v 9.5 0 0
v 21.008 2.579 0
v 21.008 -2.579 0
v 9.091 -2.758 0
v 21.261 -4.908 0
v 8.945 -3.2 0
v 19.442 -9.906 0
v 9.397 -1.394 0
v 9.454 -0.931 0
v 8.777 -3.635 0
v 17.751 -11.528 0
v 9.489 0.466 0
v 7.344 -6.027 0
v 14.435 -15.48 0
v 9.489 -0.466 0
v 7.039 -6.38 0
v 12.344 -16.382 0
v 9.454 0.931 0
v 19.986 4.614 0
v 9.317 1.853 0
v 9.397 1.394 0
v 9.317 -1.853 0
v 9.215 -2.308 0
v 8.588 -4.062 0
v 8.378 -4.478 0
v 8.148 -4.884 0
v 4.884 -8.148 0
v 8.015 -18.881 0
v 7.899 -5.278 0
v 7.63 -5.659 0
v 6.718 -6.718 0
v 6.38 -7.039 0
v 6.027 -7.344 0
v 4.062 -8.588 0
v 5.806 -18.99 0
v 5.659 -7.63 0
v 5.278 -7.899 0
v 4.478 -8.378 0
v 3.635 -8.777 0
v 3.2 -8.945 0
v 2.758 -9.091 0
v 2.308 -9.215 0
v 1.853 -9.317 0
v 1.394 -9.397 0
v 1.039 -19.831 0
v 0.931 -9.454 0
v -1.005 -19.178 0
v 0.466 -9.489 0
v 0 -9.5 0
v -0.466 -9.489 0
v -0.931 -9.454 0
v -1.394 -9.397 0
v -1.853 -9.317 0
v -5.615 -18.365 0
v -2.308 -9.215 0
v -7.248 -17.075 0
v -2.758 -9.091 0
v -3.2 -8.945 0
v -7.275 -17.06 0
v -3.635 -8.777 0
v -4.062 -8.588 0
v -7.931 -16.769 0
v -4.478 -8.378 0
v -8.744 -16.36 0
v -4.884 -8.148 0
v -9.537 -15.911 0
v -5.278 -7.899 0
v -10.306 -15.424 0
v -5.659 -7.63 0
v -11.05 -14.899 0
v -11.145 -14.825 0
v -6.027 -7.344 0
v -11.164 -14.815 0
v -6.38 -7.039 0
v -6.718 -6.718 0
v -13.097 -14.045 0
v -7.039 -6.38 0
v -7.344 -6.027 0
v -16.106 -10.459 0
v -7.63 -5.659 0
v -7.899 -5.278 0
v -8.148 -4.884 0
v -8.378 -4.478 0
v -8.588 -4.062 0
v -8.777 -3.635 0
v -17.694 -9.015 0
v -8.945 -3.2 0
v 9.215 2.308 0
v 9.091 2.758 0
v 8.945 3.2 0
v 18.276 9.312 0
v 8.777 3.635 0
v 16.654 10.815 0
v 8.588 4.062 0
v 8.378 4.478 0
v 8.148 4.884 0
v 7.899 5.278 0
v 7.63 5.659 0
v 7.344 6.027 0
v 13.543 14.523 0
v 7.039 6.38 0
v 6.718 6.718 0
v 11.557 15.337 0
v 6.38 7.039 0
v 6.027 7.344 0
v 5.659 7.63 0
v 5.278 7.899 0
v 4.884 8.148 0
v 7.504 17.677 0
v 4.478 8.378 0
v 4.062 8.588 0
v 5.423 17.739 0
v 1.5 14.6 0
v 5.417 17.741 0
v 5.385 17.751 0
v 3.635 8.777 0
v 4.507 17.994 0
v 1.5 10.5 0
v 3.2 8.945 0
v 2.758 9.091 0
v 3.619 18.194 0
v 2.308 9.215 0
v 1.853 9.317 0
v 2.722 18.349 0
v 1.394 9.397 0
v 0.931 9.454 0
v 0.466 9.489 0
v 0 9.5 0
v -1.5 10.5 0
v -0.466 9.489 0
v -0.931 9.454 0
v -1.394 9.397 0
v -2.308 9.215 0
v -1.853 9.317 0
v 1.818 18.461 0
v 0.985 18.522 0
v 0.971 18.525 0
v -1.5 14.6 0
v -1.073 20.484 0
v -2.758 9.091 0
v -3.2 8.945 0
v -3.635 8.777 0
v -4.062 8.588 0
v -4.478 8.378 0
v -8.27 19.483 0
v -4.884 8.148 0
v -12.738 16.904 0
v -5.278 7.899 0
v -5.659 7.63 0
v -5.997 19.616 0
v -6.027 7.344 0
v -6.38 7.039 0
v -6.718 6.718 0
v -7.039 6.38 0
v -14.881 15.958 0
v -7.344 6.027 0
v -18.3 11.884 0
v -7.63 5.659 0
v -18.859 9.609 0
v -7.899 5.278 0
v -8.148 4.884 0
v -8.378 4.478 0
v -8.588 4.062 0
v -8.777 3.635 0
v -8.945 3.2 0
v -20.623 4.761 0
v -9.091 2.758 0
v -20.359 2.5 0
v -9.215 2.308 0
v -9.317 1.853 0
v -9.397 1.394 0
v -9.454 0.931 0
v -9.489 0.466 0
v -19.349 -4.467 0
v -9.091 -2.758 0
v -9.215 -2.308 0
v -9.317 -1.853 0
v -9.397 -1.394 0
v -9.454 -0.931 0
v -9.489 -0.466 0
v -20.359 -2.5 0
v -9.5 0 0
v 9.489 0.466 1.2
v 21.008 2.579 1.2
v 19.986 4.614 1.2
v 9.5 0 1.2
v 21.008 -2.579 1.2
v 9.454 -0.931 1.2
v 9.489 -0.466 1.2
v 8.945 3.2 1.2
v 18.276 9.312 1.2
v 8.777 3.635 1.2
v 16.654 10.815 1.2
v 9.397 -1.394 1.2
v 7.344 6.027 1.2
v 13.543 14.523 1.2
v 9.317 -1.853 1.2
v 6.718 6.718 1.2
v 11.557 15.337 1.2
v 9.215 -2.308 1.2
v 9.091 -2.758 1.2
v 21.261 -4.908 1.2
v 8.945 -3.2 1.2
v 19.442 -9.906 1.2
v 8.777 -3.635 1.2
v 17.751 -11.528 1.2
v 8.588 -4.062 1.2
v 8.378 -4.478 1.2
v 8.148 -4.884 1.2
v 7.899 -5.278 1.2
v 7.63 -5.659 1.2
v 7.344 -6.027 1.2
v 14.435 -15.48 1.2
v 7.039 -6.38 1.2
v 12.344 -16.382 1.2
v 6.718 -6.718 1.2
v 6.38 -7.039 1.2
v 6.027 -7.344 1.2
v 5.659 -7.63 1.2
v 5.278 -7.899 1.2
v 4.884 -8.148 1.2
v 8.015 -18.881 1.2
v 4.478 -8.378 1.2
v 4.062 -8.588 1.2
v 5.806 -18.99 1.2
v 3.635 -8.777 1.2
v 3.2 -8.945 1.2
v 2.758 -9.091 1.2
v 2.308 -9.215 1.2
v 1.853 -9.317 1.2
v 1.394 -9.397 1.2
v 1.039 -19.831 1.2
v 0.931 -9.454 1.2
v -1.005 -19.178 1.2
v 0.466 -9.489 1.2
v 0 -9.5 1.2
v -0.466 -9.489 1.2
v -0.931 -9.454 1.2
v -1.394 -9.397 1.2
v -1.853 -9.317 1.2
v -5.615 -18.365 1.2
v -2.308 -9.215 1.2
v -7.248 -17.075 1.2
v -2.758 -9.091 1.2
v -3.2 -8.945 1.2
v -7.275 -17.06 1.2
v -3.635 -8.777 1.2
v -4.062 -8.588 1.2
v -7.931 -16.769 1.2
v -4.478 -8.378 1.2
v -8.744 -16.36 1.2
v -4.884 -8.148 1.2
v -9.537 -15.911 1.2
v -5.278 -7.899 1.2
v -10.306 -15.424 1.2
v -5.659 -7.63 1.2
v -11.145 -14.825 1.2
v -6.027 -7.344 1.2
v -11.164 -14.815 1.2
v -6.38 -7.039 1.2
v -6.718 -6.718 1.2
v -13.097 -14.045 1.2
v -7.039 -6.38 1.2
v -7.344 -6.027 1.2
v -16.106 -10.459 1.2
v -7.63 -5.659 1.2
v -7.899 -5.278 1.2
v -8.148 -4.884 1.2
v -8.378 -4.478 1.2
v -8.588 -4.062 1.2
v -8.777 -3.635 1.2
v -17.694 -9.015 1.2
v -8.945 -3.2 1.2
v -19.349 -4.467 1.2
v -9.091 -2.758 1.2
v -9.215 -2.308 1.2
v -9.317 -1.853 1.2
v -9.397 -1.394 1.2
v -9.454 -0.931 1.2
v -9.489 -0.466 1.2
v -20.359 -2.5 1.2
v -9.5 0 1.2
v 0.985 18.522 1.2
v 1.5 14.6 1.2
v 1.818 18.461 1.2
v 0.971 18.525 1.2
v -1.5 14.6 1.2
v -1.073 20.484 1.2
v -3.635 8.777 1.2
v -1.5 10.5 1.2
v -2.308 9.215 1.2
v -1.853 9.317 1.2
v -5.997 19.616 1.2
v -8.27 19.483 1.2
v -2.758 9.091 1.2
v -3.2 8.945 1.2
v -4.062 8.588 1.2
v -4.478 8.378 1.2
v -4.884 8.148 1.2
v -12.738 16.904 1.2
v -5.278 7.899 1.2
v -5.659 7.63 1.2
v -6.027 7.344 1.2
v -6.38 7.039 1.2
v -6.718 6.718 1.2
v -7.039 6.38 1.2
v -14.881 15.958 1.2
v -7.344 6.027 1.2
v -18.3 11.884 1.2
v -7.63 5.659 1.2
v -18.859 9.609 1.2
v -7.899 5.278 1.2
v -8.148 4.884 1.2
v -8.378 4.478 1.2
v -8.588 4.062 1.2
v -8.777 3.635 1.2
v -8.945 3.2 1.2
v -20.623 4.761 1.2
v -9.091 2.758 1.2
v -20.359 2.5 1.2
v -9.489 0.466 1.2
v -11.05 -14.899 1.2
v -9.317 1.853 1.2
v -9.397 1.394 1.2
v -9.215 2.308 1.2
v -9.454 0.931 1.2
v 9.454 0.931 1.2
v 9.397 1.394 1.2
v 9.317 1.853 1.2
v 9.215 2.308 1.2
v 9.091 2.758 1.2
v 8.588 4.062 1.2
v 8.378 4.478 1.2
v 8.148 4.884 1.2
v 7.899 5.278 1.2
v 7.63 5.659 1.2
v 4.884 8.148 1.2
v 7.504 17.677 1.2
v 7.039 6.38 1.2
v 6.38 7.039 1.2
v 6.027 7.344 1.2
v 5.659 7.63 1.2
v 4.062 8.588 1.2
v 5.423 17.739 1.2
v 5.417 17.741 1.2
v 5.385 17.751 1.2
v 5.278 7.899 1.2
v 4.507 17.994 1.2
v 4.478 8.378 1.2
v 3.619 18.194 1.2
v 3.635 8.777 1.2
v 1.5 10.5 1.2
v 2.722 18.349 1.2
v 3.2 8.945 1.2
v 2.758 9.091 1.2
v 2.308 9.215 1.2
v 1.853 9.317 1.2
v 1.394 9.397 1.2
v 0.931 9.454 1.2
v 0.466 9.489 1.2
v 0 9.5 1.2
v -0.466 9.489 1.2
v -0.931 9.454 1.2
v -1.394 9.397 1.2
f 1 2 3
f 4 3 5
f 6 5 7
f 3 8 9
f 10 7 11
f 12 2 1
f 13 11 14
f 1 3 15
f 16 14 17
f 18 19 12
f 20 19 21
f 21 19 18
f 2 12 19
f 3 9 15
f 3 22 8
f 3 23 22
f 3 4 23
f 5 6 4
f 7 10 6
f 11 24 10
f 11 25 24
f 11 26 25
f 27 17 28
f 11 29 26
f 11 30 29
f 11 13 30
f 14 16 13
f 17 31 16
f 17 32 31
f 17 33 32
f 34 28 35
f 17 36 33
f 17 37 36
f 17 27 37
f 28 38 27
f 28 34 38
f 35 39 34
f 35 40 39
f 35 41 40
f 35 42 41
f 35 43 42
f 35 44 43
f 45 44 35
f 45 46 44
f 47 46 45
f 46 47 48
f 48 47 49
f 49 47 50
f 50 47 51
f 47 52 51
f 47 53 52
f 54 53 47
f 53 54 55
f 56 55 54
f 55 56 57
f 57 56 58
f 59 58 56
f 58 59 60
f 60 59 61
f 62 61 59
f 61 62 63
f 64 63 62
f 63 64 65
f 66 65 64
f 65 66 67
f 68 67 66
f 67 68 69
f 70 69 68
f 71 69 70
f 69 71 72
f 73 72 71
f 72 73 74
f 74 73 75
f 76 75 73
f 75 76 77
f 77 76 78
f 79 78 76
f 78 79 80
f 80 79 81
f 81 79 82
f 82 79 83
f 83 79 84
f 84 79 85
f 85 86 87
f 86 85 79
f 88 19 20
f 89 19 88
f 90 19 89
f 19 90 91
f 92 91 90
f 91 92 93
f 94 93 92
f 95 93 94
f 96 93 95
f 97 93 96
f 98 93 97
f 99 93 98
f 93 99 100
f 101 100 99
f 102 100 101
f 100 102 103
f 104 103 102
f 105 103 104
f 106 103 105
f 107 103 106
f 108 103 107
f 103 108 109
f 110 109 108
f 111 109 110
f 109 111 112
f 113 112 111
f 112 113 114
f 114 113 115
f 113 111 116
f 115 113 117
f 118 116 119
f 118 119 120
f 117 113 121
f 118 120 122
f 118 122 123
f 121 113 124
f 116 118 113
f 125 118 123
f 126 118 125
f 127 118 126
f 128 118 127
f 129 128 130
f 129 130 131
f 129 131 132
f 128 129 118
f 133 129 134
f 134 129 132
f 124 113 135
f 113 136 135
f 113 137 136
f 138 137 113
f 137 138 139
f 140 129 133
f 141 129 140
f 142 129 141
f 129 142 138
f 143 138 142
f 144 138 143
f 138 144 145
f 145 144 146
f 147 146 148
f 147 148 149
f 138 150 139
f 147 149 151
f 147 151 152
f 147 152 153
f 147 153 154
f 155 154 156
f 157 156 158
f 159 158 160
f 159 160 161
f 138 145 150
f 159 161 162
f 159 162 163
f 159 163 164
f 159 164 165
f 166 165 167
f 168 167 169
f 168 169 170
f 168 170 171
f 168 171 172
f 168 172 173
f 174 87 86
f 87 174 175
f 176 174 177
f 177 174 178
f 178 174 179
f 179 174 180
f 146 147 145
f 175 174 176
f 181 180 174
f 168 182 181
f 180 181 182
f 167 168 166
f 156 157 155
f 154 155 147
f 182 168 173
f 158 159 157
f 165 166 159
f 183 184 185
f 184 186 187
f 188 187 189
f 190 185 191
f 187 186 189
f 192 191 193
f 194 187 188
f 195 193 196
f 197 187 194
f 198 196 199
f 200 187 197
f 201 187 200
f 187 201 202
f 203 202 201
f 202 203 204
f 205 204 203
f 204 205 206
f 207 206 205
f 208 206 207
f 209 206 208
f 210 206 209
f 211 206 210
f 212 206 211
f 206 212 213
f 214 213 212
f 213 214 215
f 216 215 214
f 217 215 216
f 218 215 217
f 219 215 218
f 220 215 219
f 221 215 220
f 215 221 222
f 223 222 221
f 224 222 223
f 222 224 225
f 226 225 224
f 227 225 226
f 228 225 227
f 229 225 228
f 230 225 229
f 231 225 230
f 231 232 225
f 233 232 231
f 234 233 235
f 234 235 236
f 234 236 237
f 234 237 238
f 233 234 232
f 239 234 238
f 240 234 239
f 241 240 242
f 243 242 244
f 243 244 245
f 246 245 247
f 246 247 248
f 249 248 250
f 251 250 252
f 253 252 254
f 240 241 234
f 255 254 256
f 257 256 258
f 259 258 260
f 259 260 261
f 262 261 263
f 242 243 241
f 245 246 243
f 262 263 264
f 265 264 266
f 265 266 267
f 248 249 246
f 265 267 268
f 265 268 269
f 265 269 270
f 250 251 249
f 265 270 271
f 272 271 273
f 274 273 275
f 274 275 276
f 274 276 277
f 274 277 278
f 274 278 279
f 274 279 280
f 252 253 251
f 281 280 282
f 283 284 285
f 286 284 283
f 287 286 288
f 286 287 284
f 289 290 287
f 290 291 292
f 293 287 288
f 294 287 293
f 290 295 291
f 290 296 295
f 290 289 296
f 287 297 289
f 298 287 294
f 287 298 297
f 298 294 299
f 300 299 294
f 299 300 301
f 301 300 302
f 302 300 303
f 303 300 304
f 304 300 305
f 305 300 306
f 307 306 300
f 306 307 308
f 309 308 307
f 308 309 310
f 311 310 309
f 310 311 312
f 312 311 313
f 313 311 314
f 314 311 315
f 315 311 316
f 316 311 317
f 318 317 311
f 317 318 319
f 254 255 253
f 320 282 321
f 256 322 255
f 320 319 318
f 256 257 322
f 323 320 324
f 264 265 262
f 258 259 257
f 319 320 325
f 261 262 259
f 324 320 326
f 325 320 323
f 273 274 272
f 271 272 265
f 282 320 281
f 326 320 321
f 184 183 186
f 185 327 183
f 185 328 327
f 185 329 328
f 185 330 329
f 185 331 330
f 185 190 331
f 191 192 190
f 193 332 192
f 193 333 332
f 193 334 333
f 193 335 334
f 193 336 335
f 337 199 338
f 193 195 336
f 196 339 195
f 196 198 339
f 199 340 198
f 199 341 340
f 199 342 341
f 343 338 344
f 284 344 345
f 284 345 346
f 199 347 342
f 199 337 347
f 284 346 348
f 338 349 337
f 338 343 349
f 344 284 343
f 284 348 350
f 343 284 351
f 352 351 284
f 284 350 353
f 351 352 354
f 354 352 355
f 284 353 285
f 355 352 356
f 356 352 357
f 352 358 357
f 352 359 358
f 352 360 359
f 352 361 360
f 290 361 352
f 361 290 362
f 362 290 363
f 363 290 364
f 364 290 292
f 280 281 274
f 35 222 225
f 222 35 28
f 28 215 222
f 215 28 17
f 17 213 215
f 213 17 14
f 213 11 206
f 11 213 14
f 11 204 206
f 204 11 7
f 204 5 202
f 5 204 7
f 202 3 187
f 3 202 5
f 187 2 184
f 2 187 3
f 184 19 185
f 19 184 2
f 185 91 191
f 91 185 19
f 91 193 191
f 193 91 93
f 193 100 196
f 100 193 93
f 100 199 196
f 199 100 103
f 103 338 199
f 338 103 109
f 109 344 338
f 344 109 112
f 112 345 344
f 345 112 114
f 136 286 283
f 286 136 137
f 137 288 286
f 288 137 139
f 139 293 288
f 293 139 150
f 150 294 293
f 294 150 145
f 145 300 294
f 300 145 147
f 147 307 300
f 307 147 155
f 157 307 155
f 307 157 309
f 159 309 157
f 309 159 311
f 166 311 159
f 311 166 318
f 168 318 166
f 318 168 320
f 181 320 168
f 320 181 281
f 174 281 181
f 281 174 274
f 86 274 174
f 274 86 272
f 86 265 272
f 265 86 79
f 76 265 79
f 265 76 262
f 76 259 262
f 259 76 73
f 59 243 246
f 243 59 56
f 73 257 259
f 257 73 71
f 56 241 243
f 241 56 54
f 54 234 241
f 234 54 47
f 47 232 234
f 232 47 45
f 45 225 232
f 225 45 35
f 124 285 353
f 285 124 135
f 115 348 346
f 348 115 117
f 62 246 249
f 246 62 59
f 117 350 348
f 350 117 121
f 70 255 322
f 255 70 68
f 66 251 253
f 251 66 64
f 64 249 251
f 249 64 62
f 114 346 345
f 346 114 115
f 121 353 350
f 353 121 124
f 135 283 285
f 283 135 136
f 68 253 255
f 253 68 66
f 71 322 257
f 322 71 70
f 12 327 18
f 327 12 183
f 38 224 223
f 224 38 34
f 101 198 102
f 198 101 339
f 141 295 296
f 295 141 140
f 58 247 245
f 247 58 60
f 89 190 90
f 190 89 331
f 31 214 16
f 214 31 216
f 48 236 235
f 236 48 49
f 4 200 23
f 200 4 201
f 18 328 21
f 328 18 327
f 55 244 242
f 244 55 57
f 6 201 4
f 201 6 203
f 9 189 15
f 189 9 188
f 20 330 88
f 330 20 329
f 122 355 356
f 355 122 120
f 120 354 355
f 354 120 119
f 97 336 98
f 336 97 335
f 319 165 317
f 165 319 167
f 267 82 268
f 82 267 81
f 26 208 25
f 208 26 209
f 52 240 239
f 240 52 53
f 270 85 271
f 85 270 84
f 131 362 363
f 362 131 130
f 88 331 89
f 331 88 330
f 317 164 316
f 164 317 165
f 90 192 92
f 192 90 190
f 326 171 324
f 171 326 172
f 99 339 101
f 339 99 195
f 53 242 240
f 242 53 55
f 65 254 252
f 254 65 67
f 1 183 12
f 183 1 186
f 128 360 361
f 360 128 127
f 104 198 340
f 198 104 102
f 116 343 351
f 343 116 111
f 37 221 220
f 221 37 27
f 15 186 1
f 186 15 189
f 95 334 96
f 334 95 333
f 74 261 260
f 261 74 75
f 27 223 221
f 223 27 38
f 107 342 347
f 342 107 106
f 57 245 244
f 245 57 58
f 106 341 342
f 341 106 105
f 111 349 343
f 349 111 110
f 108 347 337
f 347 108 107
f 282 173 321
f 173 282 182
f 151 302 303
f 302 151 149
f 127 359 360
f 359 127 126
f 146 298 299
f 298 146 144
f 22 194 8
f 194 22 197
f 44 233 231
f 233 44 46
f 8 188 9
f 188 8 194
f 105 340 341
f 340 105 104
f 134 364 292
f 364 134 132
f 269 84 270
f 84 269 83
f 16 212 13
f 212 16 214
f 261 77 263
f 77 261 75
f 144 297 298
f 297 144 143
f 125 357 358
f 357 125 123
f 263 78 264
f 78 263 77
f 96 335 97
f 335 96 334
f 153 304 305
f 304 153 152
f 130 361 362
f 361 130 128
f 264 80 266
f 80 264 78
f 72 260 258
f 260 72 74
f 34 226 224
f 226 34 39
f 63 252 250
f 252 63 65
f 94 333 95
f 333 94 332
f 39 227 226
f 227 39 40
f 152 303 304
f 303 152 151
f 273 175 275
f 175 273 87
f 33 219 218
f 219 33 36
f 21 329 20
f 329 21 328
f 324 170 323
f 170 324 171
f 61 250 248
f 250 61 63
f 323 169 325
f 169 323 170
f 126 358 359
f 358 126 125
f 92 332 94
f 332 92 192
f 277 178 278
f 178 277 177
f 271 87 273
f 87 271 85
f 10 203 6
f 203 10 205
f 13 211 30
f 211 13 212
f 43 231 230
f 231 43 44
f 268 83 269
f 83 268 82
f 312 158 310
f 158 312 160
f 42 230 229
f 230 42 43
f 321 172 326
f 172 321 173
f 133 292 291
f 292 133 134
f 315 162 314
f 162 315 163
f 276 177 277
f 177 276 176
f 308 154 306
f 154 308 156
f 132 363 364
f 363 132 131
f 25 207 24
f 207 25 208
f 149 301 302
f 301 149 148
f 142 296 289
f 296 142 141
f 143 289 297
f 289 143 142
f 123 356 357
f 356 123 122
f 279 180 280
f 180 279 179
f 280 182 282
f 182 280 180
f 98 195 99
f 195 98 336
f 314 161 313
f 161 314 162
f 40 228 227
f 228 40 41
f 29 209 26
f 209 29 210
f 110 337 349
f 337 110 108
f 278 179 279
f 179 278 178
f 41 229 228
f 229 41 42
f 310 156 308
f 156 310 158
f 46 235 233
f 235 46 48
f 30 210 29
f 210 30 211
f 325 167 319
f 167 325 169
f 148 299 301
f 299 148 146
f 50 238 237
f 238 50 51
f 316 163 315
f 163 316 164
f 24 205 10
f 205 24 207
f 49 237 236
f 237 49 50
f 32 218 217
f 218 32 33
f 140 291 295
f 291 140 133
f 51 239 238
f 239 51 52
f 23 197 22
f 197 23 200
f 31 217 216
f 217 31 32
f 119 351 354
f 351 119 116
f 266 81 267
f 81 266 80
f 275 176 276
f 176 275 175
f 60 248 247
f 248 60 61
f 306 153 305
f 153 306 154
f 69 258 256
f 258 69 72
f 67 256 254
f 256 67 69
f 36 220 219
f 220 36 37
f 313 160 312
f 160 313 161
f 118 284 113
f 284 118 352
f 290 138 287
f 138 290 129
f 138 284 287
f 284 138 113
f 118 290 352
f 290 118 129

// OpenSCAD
/*
  Elna Supermatic cam 21
  Name: Stair zigzag
  Status: candidate

  Generated from measured parametric base v2.
  Surface mode: stepped
*/

include <_elna_measured_common.scad>;

profile_points = [
        [0.9708, 18.5246],
        [5.4235, 17.7395],
        [7.5036, 17.6774],
        [11.5573, 15.3370],
        [13.5431, 14.5232],
        [16.6543, 10.8154],
        [18.2763, 9.3123],
        [19.9863, 4.6142],
        [21.0082, 2.5795],
        [21.0082, -2.5795],
        [21.2608, -4.9084],
        [19.4418, -9.9061],
        [17.7513, -11.5278],
        [14.4352, -15.4798],
        [12.3444, -16.3816],
        [8.0147, -18.8814],
        [5.8059, -18.9903],
        [1.0393, -19.8308],
        [-1.0051, -19.1777],
        [-5.6147, -18.3649],
        [-7.2481, -17.0754],
        [-11.1637, -14.8147],
        [-13.0971, -14.0449],
        [-16.1058, -10.4592],
        [-17.6936, -9.0153],
        [-19.3490, -4.4671],
        [-20.3591, -2.4998],
        [-20.3591, 2.4998],
        [-20.6235, 4.7613],
        [-18.8590, 9.6092],
        [-18.2998, 11.8840],
        [-14.8812, 15.9581],
        [-12.7380, 16.9039],
        [-8.2702, 19.4834],
        [-5.9971, 19.6157],
        [-1.0735, 20.4839]
];

icon_points = [[-1.000,0.180], [-0.820,0.180], [-0.820,0.360], [-0.640,0.360], [-0.640,0.560], [-0.460,0.560], [-0.460,0.740], [-0.280,0.740], [-0.280,0.560], [-0.100,0.560], [-0.100,0.360], [0.080,0.360], [0.080,0.180], [0.260,0.180], [0.260,0.360], [0.440,0.360], [0.440,0.560], [0.620,0.560], [0.620,0.740], [0.800,0.740], [1.000,0.740]];

elna_cam_ring(profile_points=profile_points);
